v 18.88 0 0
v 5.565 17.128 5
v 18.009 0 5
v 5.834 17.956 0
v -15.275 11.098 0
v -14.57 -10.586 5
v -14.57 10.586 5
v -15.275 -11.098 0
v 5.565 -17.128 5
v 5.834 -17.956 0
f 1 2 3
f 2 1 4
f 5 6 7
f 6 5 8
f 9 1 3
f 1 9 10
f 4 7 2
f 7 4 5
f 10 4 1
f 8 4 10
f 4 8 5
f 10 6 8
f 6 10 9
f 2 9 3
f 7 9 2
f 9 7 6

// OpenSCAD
// Which one would you like to see?
part = "pentagon"; // [pentagon:5,hexagon:6,both:5-6]

// diameter of the circumscribed sphere in mm
diameter = 220; // [40:400]
R = diameter/2;

// "flat" faces or "projected" on the sphere
variant="flat";// ["flat","projected"]

// in mm
thickness = 5; // [5:20]

reverse="no"; // [yes,no]


a = R / (sqrt((29 + 9*sqrt(5)) /2));

echo(part,R,variant,thickness,reverse);
print_part();

module print_part() {
  if (part == "pentagon") {
    pentagon();
  } else if (part == "hexagon") {
    hexagon();
  } else if (part == "both") {
    both();
  } else {
    both();
  }
}

module pentagon() {
  if(variant=="flat")
    flatface(R,a,5,thickness,upward=reverse=="yes"?true:false);
  else
    sphericalface(R,a,5,thickness,upward=reverse=="yes"?false:true);
}
module hexagon() {
  if(variant=="flat")
    flatface(R,a,6,thickness,upward=reverse=="yes"?true:false);
  else
    sphericalface(R,a,6,thickness,upward=reverse=="yes"?false:true);
}
module both() {
  translate([-a,0,0]) pentagon();
  translate([a,0,0]) hexagon();
}

module sphericalface(R,a,n,thickness,upward=true) {
  r = a / (2*sin(180/n));
  H = sqrt(R*R - r*r);

  translate([0,0,upward?0:R-H+thickness]) mirror([0,0,upward?0:1])
    difference() {
      translate([0,0,-H+thickness]) {
        intersection() {
          sphere(r=R);
          cylinder(2*H,r1=0,r2=2*r,$fn=n);
        }
      }
      translate([0,0,-R])
        cube(2*R, center=true);
    }
}

module flatface(R,a,n,thickness,upward=false) {
  r = a / (2*sin(180/n));
  H = sqrt(R*R - r*r);

  translate([0,0,upward?0:thickness]) mirror([0,0,upward?0:1])
    difference() {
      translate([0,0,-H+thickness]) 
        cylinder(H,r1=0,r2=r,$fn=n);
      translate([0,0,-R])
        cube(2*R, center=true);
    }      
}
